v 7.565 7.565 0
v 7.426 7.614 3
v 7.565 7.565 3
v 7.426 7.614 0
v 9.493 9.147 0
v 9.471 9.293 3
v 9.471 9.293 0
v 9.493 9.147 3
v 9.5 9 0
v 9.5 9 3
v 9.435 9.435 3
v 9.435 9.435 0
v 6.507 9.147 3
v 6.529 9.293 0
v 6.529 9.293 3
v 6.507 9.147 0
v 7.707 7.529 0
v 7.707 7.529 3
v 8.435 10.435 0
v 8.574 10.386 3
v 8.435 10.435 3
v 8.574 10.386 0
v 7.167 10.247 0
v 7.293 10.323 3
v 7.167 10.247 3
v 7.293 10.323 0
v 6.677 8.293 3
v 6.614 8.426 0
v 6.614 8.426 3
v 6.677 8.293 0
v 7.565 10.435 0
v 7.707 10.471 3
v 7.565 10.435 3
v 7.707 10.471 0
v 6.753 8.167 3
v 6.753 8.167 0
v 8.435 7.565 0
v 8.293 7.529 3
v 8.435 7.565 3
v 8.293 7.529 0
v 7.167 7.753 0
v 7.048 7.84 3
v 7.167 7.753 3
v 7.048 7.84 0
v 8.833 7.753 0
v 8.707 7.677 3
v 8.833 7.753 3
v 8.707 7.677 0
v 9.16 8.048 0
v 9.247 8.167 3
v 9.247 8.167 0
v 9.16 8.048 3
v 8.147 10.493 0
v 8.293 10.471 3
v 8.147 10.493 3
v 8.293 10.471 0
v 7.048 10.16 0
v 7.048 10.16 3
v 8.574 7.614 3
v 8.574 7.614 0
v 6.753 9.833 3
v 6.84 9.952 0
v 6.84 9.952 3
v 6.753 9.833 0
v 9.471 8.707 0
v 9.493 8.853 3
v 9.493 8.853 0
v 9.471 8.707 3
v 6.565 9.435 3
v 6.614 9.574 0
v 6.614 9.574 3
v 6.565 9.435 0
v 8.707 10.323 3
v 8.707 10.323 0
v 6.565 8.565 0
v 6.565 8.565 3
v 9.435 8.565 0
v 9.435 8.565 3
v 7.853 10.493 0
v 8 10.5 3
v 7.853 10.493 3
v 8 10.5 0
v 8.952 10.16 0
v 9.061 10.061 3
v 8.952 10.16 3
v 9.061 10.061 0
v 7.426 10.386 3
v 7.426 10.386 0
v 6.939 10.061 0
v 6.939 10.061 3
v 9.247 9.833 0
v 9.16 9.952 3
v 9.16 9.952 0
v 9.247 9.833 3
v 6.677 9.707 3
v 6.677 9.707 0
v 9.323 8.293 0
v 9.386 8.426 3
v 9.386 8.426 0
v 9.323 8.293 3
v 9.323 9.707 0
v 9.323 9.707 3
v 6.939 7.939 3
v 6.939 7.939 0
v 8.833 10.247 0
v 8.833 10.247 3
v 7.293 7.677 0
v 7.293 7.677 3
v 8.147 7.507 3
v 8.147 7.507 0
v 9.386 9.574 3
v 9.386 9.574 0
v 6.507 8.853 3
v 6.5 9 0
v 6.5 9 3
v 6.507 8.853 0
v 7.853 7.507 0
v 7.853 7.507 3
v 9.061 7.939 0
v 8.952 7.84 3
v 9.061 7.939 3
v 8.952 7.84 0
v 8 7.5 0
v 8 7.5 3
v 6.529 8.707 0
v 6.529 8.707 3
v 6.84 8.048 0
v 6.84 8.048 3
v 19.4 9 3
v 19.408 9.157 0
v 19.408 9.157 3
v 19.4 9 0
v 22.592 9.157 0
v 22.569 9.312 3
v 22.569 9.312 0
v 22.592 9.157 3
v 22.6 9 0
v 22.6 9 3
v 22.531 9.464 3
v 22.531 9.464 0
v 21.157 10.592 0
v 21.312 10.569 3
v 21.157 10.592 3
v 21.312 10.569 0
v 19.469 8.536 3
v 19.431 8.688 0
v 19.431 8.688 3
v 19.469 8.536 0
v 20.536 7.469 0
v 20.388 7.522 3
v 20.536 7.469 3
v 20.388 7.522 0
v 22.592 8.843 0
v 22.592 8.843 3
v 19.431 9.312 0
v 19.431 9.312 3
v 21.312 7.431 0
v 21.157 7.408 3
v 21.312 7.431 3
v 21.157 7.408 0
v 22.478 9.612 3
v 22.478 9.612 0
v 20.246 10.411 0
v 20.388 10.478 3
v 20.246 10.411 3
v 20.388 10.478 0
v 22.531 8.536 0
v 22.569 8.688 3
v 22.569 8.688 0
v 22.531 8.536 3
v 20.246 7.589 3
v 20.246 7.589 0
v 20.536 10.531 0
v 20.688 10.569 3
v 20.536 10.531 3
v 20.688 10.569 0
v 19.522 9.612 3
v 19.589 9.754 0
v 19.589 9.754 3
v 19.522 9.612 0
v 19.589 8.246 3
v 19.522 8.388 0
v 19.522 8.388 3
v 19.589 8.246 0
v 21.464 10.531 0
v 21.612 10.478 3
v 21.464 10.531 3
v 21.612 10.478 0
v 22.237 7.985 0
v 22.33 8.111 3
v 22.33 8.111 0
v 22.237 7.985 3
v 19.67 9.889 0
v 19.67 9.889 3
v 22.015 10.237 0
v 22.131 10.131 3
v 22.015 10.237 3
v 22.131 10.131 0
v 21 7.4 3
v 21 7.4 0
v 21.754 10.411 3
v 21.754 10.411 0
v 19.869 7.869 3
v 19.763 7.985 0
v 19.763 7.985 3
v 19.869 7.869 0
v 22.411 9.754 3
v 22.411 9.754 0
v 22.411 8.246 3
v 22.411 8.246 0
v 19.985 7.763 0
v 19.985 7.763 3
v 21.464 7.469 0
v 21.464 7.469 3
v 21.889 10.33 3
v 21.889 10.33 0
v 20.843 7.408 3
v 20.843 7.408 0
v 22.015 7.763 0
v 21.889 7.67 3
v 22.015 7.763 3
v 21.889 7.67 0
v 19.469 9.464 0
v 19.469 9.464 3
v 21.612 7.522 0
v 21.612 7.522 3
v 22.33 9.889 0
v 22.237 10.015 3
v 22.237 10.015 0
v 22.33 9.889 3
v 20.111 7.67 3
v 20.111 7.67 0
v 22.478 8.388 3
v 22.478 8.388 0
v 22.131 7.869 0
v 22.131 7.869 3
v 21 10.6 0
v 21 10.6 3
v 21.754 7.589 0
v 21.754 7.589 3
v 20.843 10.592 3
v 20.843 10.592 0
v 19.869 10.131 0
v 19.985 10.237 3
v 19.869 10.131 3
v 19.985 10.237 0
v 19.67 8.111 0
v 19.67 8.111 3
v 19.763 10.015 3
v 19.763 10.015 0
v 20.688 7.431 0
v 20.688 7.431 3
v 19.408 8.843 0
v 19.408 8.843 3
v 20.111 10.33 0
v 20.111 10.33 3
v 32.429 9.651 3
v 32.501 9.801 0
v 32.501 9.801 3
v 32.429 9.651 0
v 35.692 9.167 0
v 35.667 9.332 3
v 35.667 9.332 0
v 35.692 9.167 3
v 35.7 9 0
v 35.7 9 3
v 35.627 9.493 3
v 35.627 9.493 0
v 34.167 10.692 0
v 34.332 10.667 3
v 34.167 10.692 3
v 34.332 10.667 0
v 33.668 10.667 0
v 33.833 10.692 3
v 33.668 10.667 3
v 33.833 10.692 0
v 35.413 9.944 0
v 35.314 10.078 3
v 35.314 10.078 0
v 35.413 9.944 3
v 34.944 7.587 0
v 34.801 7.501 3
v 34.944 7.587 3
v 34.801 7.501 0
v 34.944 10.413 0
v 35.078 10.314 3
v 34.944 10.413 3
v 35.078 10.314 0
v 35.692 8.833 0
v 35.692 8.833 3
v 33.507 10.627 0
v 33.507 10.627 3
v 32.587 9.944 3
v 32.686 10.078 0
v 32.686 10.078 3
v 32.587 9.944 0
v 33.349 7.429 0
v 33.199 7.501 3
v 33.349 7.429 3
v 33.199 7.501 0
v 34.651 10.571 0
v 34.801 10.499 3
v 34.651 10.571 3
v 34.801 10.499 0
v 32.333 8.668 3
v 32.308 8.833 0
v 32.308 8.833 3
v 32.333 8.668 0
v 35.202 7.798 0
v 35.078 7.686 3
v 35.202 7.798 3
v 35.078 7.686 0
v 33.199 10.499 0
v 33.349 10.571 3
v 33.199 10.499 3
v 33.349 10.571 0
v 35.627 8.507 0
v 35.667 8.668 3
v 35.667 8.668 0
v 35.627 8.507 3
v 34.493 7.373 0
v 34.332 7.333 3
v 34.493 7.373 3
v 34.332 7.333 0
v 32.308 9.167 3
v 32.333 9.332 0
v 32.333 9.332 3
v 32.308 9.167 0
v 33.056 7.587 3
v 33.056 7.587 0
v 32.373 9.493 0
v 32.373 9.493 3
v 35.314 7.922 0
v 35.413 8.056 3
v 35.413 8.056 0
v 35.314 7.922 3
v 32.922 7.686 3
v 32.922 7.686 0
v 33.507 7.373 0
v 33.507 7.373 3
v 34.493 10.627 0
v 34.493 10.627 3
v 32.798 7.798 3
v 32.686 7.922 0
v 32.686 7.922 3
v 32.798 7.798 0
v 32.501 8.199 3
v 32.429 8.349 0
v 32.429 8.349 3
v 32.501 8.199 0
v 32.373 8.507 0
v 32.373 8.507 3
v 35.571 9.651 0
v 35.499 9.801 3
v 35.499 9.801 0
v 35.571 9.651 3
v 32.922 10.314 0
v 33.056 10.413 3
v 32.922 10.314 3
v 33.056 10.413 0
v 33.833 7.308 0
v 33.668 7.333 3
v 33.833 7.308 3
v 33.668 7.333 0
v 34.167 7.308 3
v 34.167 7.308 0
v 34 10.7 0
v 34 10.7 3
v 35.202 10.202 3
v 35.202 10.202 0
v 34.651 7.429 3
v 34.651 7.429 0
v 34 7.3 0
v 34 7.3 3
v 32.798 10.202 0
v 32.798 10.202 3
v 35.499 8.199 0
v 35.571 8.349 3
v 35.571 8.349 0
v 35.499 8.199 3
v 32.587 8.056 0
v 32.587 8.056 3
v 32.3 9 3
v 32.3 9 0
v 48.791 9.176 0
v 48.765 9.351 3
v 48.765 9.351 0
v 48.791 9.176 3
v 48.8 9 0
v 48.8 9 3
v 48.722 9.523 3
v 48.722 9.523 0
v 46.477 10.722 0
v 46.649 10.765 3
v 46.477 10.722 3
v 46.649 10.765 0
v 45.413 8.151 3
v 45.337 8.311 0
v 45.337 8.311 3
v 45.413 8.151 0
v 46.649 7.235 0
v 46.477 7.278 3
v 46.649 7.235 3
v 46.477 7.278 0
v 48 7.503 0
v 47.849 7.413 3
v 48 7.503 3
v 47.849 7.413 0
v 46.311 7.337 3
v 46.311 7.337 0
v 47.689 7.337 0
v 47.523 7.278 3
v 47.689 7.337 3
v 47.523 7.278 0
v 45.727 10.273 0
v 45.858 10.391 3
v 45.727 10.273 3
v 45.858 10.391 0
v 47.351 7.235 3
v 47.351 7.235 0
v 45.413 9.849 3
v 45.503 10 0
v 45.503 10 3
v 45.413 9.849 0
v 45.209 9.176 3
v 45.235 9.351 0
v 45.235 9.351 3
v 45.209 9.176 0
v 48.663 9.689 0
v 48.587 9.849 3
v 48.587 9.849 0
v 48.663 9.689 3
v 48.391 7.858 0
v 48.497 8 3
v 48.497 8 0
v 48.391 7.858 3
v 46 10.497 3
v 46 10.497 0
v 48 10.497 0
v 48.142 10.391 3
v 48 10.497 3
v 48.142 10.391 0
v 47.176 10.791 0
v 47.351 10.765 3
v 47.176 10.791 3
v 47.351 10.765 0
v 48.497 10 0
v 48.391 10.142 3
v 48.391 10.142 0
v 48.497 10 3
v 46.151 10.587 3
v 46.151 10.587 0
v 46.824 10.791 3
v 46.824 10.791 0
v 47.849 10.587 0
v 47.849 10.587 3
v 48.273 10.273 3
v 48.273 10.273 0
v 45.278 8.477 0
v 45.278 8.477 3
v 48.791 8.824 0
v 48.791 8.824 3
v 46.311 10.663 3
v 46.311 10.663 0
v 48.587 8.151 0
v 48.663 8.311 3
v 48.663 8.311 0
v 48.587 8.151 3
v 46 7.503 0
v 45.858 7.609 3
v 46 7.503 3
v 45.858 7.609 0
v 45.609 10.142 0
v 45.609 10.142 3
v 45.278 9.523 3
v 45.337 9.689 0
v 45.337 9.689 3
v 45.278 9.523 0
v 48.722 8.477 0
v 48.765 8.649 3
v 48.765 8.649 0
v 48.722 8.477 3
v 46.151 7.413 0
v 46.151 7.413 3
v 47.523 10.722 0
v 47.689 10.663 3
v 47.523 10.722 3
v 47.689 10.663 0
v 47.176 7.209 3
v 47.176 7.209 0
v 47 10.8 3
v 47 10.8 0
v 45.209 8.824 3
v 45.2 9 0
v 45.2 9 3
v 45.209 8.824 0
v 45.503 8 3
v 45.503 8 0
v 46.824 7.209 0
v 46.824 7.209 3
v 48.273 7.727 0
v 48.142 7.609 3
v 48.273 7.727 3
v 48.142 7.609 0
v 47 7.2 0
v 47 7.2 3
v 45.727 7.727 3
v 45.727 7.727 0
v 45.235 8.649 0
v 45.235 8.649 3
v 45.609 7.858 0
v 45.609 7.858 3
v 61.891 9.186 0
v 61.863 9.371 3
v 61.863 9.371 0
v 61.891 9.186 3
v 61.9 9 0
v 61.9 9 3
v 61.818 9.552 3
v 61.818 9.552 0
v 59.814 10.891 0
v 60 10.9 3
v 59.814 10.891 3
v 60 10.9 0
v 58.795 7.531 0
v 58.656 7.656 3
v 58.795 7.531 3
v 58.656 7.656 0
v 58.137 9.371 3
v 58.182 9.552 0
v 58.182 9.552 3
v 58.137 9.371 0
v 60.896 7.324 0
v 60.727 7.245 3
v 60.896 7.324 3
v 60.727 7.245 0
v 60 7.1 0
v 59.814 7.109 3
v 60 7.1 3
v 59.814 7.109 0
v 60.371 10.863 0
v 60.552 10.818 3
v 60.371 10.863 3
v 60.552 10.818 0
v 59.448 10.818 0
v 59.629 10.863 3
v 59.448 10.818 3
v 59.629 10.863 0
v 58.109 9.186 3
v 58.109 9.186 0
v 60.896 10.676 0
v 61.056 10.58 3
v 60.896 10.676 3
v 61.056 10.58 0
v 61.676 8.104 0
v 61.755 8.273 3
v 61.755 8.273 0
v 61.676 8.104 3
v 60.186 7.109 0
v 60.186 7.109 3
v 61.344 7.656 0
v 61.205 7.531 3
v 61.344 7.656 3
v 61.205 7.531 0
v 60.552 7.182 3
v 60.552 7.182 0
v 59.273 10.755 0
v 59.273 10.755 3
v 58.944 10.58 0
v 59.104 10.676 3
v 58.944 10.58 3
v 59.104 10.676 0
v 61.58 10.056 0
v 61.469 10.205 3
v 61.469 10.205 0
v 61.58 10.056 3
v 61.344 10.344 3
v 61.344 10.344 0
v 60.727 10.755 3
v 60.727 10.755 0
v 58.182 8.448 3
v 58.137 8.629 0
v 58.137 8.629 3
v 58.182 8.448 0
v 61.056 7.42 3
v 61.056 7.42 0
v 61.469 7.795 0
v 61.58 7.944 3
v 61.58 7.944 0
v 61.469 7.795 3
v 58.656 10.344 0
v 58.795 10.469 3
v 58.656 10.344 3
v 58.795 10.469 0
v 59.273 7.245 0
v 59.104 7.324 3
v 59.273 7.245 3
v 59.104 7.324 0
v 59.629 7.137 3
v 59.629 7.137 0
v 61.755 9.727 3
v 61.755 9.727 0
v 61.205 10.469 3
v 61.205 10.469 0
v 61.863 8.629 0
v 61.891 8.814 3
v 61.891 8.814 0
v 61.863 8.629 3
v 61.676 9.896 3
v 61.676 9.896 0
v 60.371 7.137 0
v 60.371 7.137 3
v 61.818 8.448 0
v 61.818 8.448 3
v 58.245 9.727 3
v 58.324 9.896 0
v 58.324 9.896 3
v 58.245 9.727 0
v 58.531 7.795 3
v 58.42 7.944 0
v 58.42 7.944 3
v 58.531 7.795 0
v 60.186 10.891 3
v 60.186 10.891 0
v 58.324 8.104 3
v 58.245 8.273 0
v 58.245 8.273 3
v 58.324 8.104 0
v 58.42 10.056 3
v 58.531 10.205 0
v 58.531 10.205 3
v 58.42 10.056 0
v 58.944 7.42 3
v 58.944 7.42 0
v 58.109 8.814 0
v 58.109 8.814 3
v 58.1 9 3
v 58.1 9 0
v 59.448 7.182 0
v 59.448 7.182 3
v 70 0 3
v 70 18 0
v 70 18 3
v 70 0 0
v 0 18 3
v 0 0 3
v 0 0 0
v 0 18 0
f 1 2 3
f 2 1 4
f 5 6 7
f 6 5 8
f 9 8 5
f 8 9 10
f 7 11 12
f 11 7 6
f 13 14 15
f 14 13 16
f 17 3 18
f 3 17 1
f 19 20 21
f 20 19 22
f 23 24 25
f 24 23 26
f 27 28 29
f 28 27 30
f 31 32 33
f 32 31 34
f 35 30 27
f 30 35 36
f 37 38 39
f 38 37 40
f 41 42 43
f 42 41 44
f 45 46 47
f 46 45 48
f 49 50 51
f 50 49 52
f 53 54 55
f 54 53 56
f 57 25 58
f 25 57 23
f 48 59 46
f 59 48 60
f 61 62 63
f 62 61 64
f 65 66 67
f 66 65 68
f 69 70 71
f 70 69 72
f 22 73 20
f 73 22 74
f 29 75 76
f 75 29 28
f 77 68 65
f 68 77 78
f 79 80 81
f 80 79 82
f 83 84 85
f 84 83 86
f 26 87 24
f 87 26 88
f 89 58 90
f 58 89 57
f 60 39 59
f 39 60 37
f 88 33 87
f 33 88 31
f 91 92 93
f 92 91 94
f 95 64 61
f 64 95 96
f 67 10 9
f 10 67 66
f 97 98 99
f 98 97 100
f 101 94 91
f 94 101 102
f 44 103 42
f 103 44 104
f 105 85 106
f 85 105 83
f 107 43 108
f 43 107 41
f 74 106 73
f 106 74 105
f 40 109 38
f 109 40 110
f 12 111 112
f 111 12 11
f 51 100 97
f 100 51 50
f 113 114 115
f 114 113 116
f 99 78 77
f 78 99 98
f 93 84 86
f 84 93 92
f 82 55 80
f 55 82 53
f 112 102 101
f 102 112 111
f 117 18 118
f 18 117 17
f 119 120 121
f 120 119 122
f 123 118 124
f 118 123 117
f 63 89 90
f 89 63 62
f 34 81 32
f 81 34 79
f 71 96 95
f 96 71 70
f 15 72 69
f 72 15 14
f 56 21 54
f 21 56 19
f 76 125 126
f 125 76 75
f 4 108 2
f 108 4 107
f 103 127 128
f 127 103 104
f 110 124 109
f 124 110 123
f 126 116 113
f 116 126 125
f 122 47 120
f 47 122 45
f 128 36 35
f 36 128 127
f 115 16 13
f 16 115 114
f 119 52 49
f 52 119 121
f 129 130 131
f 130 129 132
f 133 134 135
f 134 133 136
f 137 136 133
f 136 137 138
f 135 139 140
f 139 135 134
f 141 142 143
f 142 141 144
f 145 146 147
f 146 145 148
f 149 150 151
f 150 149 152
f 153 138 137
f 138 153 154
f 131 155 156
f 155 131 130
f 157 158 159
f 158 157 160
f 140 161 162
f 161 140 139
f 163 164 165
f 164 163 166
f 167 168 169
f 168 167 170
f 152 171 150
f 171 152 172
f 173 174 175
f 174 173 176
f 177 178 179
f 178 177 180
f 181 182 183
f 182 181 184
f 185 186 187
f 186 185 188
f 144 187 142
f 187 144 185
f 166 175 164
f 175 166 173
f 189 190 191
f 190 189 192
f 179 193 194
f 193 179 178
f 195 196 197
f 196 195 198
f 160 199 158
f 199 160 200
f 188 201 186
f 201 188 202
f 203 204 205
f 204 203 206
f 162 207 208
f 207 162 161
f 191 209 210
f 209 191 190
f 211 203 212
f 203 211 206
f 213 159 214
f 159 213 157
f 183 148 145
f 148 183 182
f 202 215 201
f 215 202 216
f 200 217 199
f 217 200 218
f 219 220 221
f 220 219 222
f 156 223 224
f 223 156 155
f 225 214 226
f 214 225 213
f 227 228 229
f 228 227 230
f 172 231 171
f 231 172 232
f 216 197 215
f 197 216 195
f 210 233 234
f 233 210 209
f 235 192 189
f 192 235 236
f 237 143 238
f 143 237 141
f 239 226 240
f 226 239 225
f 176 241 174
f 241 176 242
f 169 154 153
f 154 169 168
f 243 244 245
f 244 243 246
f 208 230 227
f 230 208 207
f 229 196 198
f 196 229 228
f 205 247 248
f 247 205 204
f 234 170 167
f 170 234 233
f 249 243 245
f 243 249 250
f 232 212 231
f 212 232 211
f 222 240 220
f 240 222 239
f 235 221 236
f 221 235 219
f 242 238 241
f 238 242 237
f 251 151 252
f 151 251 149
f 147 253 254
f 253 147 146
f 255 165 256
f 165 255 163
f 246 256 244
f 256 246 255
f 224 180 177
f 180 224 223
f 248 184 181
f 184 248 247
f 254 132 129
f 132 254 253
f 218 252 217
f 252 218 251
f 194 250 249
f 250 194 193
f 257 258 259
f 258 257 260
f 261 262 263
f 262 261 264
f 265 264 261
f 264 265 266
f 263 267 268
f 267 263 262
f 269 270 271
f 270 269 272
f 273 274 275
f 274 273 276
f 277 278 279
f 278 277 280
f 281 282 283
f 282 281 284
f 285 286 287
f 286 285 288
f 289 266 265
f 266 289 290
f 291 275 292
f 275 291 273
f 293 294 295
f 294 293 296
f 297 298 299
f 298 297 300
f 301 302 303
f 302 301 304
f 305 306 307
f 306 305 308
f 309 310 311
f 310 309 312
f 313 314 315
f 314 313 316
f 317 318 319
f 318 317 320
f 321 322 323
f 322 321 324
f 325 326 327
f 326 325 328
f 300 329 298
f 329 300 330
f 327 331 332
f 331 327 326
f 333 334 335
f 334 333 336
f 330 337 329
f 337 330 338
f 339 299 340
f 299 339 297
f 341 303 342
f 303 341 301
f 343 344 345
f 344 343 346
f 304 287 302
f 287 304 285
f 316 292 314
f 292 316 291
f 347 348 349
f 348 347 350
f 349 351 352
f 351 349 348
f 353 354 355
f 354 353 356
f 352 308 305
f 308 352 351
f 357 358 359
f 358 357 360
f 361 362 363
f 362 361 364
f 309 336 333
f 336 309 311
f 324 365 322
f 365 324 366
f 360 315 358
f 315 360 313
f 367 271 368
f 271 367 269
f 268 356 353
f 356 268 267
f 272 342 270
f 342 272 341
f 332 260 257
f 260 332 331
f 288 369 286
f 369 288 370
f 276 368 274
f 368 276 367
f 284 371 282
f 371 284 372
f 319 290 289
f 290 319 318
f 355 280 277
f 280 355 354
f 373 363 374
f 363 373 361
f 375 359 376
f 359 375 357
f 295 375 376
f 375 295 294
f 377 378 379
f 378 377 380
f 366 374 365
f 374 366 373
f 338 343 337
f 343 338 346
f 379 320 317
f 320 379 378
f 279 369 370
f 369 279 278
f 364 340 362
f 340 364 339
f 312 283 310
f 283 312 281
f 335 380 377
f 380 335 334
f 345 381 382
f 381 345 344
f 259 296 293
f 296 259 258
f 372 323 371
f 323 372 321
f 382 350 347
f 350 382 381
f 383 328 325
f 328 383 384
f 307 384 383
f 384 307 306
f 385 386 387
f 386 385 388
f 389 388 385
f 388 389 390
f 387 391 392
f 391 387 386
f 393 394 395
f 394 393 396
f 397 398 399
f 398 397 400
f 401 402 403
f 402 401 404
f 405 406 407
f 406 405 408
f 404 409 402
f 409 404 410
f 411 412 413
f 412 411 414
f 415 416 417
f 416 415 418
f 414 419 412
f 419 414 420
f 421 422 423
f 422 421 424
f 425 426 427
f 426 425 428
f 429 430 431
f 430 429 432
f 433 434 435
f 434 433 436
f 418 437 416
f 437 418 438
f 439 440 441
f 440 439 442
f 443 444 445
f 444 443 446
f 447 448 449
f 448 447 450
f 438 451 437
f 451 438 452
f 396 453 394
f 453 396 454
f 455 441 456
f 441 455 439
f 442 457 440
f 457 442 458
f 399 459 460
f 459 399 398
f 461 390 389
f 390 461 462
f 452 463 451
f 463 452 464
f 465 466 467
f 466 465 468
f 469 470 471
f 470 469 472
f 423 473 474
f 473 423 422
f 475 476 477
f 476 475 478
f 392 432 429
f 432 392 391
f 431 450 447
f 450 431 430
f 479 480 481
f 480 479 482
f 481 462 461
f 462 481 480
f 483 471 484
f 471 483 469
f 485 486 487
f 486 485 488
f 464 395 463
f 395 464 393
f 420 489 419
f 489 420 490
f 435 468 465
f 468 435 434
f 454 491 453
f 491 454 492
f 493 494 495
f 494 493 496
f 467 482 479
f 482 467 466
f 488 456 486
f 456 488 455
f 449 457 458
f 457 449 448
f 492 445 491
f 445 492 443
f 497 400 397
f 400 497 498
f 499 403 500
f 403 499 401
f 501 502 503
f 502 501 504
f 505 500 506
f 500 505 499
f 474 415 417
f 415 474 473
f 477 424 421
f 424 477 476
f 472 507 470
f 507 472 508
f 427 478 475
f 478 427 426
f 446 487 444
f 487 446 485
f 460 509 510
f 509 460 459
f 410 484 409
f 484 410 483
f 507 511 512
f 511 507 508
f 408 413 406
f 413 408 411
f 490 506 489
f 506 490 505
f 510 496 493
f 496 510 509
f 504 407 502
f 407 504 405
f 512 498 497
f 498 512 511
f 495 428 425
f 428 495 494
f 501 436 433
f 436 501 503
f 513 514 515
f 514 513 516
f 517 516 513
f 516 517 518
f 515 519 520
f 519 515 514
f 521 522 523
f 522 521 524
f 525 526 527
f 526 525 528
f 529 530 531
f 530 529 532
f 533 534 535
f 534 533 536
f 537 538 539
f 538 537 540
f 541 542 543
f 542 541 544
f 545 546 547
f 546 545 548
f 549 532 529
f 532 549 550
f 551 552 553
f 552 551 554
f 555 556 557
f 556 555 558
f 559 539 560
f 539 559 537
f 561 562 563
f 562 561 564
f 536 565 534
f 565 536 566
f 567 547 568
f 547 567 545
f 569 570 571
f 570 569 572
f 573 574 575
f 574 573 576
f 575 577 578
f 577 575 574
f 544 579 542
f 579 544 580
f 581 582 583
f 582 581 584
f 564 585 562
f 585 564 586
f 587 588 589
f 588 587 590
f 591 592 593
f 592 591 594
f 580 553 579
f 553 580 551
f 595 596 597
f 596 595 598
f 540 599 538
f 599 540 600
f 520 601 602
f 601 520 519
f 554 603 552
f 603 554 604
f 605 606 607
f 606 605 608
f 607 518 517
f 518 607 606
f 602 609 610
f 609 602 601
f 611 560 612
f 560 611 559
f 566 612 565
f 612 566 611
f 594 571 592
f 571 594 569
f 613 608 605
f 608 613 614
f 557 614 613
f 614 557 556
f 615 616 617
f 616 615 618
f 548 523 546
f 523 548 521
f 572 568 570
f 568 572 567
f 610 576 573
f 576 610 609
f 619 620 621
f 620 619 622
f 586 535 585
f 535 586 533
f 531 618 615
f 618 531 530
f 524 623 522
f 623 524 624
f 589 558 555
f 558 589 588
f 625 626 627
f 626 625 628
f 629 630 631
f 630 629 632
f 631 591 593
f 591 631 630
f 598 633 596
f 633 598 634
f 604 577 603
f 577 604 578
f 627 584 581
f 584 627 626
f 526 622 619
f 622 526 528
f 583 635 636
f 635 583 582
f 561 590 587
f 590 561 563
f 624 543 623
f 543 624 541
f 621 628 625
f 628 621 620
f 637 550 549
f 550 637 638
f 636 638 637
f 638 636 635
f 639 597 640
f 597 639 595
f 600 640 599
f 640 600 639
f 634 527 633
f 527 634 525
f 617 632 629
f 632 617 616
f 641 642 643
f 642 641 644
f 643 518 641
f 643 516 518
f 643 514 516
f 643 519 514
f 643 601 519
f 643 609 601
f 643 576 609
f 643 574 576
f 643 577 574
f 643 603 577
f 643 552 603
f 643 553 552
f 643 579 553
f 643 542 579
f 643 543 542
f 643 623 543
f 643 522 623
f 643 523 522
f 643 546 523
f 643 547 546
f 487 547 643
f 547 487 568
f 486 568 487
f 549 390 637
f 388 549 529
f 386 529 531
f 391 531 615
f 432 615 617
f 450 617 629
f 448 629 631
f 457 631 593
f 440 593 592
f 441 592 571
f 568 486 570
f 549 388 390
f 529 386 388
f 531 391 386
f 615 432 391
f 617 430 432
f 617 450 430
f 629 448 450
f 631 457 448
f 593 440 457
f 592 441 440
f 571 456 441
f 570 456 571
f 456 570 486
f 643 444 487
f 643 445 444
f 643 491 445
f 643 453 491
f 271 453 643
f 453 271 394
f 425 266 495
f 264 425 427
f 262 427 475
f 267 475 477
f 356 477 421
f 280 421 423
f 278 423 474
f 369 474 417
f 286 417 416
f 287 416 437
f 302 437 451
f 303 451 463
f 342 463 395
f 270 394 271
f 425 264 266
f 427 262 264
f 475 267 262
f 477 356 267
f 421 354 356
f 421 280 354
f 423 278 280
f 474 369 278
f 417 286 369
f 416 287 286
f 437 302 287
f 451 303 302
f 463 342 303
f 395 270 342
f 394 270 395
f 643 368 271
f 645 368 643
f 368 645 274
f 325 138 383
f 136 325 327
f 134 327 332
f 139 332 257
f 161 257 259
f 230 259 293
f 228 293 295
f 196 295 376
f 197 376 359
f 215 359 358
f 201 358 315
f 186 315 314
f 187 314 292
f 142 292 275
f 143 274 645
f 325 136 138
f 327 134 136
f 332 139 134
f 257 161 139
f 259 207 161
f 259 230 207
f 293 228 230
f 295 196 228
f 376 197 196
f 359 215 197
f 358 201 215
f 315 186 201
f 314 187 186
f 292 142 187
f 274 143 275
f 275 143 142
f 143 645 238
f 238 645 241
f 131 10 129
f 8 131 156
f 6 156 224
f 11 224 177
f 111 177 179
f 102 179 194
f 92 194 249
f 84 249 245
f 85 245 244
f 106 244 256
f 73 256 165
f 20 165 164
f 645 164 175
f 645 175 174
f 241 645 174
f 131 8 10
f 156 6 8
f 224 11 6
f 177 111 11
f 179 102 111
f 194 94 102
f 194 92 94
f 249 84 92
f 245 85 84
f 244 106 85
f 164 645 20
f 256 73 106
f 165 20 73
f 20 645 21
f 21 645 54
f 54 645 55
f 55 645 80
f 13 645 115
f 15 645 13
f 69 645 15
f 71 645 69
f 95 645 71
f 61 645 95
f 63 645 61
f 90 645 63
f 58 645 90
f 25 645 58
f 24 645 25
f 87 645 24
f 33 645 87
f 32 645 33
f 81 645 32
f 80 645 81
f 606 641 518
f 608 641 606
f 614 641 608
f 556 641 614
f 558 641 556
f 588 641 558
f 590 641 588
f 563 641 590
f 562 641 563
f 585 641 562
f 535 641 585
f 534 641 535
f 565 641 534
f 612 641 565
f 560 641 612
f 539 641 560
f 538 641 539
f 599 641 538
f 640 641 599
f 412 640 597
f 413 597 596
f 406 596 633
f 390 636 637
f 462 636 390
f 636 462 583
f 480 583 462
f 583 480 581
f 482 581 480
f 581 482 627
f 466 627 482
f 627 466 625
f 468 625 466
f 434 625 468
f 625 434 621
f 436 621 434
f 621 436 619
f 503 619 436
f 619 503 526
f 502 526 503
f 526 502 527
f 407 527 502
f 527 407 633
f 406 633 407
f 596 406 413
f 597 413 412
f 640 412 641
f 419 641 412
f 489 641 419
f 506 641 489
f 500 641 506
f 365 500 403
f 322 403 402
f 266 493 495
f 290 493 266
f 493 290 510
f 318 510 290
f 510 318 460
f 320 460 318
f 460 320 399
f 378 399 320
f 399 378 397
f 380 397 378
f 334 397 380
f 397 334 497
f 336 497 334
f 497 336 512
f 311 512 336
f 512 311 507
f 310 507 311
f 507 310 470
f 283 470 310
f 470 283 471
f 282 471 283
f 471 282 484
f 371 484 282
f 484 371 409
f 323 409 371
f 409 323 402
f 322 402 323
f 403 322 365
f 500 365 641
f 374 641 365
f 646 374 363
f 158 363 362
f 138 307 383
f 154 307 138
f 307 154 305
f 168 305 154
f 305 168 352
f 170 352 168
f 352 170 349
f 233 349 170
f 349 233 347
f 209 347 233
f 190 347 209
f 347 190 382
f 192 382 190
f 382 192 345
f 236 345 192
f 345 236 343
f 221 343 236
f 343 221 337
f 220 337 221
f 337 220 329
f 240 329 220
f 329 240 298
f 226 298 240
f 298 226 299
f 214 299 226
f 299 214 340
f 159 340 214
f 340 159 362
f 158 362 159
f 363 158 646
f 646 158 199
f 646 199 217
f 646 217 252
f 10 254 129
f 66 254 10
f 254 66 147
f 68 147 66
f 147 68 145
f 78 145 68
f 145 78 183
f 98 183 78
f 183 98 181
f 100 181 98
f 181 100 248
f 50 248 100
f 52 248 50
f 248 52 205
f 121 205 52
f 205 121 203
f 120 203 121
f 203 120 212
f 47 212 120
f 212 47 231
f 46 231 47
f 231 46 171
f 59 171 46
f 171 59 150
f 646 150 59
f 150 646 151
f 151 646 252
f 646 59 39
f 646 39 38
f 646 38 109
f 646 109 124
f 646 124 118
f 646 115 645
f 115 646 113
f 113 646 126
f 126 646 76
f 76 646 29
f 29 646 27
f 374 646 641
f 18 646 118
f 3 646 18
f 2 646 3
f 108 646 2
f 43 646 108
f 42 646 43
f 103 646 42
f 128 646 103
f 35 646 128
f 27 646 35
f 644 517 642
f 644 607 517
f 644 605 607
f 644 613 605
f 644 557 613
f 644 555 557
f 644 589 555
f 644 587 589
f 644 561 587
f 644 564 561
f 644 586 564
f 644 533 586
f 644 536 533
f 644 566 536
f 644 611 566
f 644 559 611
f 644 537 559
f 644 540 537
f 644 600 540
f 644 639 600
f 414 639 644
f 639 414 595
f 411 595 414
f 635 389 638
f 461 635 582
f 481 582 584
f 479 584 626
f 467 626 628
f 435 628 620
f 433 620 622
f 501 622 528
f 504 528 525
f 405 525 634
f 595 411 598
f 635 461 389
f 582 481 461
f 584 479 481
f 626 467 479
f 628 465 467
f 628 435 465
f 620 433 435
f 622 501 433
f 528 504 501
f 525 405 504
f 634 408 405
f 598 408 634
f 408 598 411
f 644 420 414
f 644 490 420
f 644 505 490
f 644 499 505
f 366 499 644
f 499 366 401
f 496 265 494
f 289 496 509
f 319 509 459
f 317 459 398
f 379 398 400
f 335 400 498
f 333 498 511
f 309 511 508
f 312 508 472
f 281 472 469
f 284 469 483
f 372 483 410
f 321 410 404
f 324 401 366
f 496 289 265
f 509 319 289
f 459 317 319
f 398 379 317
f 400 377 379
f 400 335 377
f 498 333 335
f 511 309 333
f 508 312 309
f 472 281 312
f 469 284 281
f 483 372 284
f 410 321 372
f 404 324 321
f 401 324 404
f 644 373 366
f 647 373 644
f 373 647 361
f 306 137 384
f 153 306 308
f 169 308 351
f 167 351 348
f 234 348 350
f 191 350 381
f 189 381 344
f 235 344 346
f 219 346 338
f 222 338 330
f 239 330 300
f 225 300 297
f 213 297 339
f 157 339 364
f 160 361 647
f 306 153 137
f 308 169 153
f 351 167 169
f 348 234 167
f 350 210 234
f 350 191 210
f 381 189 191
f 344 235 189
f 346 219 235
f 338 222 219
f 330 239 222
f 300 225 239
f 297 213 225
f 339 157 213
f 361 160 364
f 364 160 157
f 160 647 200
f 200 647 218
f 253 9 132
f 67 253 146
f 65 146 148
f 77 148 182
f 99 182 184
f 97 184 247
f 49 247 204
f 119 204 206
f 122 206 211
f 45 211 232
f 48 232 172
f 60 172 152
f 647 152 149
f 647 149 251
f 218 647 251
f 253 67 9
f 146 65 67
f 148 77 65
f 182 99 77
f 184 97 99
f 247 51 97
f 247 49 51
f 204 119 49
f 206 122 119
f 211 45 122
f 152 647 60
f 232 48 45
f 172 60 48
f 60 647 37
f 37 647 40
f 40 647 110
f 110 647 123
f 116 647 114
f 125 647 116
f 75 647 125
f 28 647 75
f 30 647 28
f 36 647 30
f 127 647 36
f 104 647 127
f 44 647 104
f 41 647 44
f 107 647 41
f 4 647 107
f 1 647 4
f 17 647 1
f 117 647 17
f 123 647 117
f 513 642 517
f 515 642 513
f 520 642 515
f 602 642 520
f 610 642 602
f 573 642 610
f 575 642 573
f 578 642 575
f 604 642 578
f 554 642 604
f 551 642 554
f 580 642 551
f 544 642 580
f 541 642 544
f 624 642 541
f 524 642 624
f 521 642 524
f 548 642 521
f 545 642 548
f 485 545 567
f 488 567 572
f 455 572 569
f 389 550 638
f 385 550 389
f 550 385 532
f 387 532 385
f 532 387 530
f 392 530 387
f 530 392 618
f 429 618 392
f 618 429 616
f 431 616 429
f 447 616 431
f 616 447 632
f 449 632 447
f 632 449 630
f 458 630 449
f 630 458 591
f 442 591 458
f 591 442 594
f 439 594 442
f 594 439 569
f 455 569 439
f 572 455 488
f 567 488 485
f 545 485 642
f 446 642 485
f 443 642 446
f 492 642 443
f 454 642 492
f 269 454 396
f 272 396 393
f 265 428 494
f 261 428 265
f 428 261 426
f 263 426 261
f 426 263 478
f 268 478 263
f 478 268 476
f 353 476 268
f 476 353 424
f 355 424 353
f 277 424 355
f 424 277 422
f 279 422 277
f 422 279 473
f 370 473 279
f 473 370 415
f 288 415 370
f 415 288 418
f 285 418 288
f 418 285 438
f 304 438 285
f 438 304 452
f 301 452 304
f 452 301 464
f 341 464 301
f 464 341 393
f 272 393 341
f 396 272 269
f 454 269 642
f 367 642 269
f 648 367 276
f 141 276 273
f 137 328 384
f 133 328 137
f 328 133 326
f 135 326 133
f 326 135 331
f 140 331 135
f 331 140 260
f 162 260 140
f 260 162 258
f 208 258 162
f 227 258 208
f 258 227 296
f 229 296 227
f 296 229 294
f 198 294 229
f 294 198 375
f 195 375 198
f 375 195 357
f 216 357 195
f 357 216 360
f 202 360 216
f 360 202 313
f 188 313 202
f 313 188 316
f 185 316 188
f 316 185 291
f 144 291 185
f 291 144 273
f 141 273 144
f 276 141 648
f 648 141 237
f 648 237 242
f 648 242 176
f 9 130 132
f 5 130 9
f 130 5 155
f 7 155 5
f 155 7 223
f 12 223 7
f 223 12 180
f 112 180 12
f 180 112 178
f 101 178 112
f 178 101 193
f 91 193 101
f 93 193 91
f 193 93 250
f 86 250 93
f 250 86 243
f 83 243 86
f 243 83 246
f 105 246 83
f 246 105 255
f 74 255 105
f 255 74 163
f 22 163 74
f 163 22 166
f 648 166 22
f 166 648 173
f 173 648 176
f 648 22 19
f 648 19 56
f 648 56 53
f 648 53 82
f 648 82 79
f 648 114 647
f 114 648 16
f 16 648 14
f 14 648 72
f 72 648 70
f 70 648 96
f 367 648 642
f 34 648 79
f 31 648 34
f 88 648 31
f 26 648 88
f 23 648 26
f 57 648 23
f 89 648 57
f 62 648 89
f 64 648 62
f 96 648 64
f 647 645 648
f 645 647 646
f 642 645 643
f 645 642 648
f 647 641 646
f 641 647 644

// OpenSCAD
// SystemEdu 打印传动试制源 / 单位 mm / 未经实物试配
// 改齿数、孔径补偿、中心距补偿后，重新渲染再导出 STL。先打印 coupon。
part="coupon"; // coupon, big, pinion, motor_pinion, base, spacer, crank, knob, motor_shelf, guard, crank_collar
teeth=72; clearance=0.3; mesh_gap=0.15;
motor_bore=2.0; // 必须测量实购电机轴；用试配片修改，不能锤击压入
motor_lift=0; // 电机独立打印垫片高度，以实际轴肩高度对齐第二级齿轮
spacer_height=26.5; // 中间轴 26.5；输入轴 32.5；护罩柱 43 mm
$fn=64;
center=(teeth+18)/2+mesh_gap; x0=teeth/2+10; yy=(teeth+22)/2;
ww=1.5*teeth+46+2*mesh_gap; dd=teeth+22;
function inv(r,b)=let(a=acos(min(1,b/r))) tan(a)-a*PI/180;
function polar(r,a)=[r*cos(a),r*sin(a)];
function flank(n,r)=90/n-0.025/(n/2)*180/PI+(inv(n/2,n/2*cos(20))-inv(r,n/2*cos(20)))*180/PI;
function outline(n)=let(root=n/2-1.25,tip=n/2+1,start=max(root,n/2*cos(20))) [for(i=[0:n-1]) each concat([polar(root,i*360/n-180/n),polar(root,i*360/n-flank(n,start))],[for(j=[0:7]) let(r=start+(tip-start)*j/7) polar(r,i*360/n-flank(n,r))],[for(j=[7:-1:0]) let(r=start+(tip-start)*j/7) polar(r,i*360/n+flank(n,r))],[polar(root,i*360/n+flank(n,start))])];
module gear(n,bore,bolts=true){difference(){linear_extrude(6) polygon(outline(n));translate([0,0,-1]) cylinder(h=8,d=bore);if(bolts)for(a=[0:120:240])translate([5*cos(a),5*sin(a),-1])cylinder(h=8,d=2.3);}}
module plate(w,d,h=3){cube([w,d,h]);}
if(part=="big") gear(teeth,3+clearance);
if(part=="pinion") gear(18,3+clearance);
if(part=="motor_pinion") gear(18,motor_bore,false);
if(part=="coupon") difference(){plate(70,18);for(i=[0:4])translate([8+i*13,9,-1]) cylinder(h=5,d=3+i*.2);}
if(part=="base")difference(){plate(ww,dd);for(x=[x0,x0+center])translate([x,yy,-1])cylinder(h=5,d=3.4);for(x=[x0+2*center-12,x0+2*center+12])for(y=[yy-16,yy+16])translate([x,y,-1])cylinder(h=5,d=3.4);for(x=[6,ww-6])for(y=[6,dd-6])translate([x,y,-1])cylinder(h=5,d=3.4);}
if(part=="spacer")difference(){cylinder(h=spacer_height,d=10);translate([0,0,-1])cylinder(h=spacer_height+2,d=3.4);}
if(part=="crank_collar")difference(){cylinder(h=8,d=14);translate([0,0,-1])cylinder(h=10,d=3.4);for(a=[0:120:240])translate([5*cos(a),5*sin(a),-1])cylinder(h=10,d=2.3);}
if(part=="crank")difference(){hull(){cylinder(h=4,d=15);translate([22,0,0])cylinder(h=4,d=12);}for(a=[0:120:240])translate([5*cos(a),5*sin(a),-1])cylinder(h=6,d=2.3);translate([0,0,-1])cylinder(h=6,d=3.4);translate([22,0,-1])cylinder(h=6,d=3.4);}
if(part=="knob")difference(){cylinder(h=14,d=12);translate([0,0,-1])cylinder(h=16,d=3.4);}
// 电机不依赖特定金属夹具：在平托架上用两条扎带固定。垫片和轴孔由实测调整。
if(part=="motor_shelf")difference(){plate(30,38,3+motor_lift);for(x=[3,27])for(y=[3,35])translate([x,y,-1])cylinder(h=6+motor_lift,d=3.4);for(x=[4,24])translate([x,8,-1])cube([2,22,6+motor_lift]);}
// 护罩平放打印，4 个打印支柱承托；尺寸必须结合摇柄高度试配。
if(part=="guard")difference(){plate(ww,dd,2);for(x=[6,ww-6])for(y=[6,dd-6])translate([x,y,-1])cylinder(h=4,d=3.4);translate([x0,yy,-1])cylinder(h=4,d=17);}
